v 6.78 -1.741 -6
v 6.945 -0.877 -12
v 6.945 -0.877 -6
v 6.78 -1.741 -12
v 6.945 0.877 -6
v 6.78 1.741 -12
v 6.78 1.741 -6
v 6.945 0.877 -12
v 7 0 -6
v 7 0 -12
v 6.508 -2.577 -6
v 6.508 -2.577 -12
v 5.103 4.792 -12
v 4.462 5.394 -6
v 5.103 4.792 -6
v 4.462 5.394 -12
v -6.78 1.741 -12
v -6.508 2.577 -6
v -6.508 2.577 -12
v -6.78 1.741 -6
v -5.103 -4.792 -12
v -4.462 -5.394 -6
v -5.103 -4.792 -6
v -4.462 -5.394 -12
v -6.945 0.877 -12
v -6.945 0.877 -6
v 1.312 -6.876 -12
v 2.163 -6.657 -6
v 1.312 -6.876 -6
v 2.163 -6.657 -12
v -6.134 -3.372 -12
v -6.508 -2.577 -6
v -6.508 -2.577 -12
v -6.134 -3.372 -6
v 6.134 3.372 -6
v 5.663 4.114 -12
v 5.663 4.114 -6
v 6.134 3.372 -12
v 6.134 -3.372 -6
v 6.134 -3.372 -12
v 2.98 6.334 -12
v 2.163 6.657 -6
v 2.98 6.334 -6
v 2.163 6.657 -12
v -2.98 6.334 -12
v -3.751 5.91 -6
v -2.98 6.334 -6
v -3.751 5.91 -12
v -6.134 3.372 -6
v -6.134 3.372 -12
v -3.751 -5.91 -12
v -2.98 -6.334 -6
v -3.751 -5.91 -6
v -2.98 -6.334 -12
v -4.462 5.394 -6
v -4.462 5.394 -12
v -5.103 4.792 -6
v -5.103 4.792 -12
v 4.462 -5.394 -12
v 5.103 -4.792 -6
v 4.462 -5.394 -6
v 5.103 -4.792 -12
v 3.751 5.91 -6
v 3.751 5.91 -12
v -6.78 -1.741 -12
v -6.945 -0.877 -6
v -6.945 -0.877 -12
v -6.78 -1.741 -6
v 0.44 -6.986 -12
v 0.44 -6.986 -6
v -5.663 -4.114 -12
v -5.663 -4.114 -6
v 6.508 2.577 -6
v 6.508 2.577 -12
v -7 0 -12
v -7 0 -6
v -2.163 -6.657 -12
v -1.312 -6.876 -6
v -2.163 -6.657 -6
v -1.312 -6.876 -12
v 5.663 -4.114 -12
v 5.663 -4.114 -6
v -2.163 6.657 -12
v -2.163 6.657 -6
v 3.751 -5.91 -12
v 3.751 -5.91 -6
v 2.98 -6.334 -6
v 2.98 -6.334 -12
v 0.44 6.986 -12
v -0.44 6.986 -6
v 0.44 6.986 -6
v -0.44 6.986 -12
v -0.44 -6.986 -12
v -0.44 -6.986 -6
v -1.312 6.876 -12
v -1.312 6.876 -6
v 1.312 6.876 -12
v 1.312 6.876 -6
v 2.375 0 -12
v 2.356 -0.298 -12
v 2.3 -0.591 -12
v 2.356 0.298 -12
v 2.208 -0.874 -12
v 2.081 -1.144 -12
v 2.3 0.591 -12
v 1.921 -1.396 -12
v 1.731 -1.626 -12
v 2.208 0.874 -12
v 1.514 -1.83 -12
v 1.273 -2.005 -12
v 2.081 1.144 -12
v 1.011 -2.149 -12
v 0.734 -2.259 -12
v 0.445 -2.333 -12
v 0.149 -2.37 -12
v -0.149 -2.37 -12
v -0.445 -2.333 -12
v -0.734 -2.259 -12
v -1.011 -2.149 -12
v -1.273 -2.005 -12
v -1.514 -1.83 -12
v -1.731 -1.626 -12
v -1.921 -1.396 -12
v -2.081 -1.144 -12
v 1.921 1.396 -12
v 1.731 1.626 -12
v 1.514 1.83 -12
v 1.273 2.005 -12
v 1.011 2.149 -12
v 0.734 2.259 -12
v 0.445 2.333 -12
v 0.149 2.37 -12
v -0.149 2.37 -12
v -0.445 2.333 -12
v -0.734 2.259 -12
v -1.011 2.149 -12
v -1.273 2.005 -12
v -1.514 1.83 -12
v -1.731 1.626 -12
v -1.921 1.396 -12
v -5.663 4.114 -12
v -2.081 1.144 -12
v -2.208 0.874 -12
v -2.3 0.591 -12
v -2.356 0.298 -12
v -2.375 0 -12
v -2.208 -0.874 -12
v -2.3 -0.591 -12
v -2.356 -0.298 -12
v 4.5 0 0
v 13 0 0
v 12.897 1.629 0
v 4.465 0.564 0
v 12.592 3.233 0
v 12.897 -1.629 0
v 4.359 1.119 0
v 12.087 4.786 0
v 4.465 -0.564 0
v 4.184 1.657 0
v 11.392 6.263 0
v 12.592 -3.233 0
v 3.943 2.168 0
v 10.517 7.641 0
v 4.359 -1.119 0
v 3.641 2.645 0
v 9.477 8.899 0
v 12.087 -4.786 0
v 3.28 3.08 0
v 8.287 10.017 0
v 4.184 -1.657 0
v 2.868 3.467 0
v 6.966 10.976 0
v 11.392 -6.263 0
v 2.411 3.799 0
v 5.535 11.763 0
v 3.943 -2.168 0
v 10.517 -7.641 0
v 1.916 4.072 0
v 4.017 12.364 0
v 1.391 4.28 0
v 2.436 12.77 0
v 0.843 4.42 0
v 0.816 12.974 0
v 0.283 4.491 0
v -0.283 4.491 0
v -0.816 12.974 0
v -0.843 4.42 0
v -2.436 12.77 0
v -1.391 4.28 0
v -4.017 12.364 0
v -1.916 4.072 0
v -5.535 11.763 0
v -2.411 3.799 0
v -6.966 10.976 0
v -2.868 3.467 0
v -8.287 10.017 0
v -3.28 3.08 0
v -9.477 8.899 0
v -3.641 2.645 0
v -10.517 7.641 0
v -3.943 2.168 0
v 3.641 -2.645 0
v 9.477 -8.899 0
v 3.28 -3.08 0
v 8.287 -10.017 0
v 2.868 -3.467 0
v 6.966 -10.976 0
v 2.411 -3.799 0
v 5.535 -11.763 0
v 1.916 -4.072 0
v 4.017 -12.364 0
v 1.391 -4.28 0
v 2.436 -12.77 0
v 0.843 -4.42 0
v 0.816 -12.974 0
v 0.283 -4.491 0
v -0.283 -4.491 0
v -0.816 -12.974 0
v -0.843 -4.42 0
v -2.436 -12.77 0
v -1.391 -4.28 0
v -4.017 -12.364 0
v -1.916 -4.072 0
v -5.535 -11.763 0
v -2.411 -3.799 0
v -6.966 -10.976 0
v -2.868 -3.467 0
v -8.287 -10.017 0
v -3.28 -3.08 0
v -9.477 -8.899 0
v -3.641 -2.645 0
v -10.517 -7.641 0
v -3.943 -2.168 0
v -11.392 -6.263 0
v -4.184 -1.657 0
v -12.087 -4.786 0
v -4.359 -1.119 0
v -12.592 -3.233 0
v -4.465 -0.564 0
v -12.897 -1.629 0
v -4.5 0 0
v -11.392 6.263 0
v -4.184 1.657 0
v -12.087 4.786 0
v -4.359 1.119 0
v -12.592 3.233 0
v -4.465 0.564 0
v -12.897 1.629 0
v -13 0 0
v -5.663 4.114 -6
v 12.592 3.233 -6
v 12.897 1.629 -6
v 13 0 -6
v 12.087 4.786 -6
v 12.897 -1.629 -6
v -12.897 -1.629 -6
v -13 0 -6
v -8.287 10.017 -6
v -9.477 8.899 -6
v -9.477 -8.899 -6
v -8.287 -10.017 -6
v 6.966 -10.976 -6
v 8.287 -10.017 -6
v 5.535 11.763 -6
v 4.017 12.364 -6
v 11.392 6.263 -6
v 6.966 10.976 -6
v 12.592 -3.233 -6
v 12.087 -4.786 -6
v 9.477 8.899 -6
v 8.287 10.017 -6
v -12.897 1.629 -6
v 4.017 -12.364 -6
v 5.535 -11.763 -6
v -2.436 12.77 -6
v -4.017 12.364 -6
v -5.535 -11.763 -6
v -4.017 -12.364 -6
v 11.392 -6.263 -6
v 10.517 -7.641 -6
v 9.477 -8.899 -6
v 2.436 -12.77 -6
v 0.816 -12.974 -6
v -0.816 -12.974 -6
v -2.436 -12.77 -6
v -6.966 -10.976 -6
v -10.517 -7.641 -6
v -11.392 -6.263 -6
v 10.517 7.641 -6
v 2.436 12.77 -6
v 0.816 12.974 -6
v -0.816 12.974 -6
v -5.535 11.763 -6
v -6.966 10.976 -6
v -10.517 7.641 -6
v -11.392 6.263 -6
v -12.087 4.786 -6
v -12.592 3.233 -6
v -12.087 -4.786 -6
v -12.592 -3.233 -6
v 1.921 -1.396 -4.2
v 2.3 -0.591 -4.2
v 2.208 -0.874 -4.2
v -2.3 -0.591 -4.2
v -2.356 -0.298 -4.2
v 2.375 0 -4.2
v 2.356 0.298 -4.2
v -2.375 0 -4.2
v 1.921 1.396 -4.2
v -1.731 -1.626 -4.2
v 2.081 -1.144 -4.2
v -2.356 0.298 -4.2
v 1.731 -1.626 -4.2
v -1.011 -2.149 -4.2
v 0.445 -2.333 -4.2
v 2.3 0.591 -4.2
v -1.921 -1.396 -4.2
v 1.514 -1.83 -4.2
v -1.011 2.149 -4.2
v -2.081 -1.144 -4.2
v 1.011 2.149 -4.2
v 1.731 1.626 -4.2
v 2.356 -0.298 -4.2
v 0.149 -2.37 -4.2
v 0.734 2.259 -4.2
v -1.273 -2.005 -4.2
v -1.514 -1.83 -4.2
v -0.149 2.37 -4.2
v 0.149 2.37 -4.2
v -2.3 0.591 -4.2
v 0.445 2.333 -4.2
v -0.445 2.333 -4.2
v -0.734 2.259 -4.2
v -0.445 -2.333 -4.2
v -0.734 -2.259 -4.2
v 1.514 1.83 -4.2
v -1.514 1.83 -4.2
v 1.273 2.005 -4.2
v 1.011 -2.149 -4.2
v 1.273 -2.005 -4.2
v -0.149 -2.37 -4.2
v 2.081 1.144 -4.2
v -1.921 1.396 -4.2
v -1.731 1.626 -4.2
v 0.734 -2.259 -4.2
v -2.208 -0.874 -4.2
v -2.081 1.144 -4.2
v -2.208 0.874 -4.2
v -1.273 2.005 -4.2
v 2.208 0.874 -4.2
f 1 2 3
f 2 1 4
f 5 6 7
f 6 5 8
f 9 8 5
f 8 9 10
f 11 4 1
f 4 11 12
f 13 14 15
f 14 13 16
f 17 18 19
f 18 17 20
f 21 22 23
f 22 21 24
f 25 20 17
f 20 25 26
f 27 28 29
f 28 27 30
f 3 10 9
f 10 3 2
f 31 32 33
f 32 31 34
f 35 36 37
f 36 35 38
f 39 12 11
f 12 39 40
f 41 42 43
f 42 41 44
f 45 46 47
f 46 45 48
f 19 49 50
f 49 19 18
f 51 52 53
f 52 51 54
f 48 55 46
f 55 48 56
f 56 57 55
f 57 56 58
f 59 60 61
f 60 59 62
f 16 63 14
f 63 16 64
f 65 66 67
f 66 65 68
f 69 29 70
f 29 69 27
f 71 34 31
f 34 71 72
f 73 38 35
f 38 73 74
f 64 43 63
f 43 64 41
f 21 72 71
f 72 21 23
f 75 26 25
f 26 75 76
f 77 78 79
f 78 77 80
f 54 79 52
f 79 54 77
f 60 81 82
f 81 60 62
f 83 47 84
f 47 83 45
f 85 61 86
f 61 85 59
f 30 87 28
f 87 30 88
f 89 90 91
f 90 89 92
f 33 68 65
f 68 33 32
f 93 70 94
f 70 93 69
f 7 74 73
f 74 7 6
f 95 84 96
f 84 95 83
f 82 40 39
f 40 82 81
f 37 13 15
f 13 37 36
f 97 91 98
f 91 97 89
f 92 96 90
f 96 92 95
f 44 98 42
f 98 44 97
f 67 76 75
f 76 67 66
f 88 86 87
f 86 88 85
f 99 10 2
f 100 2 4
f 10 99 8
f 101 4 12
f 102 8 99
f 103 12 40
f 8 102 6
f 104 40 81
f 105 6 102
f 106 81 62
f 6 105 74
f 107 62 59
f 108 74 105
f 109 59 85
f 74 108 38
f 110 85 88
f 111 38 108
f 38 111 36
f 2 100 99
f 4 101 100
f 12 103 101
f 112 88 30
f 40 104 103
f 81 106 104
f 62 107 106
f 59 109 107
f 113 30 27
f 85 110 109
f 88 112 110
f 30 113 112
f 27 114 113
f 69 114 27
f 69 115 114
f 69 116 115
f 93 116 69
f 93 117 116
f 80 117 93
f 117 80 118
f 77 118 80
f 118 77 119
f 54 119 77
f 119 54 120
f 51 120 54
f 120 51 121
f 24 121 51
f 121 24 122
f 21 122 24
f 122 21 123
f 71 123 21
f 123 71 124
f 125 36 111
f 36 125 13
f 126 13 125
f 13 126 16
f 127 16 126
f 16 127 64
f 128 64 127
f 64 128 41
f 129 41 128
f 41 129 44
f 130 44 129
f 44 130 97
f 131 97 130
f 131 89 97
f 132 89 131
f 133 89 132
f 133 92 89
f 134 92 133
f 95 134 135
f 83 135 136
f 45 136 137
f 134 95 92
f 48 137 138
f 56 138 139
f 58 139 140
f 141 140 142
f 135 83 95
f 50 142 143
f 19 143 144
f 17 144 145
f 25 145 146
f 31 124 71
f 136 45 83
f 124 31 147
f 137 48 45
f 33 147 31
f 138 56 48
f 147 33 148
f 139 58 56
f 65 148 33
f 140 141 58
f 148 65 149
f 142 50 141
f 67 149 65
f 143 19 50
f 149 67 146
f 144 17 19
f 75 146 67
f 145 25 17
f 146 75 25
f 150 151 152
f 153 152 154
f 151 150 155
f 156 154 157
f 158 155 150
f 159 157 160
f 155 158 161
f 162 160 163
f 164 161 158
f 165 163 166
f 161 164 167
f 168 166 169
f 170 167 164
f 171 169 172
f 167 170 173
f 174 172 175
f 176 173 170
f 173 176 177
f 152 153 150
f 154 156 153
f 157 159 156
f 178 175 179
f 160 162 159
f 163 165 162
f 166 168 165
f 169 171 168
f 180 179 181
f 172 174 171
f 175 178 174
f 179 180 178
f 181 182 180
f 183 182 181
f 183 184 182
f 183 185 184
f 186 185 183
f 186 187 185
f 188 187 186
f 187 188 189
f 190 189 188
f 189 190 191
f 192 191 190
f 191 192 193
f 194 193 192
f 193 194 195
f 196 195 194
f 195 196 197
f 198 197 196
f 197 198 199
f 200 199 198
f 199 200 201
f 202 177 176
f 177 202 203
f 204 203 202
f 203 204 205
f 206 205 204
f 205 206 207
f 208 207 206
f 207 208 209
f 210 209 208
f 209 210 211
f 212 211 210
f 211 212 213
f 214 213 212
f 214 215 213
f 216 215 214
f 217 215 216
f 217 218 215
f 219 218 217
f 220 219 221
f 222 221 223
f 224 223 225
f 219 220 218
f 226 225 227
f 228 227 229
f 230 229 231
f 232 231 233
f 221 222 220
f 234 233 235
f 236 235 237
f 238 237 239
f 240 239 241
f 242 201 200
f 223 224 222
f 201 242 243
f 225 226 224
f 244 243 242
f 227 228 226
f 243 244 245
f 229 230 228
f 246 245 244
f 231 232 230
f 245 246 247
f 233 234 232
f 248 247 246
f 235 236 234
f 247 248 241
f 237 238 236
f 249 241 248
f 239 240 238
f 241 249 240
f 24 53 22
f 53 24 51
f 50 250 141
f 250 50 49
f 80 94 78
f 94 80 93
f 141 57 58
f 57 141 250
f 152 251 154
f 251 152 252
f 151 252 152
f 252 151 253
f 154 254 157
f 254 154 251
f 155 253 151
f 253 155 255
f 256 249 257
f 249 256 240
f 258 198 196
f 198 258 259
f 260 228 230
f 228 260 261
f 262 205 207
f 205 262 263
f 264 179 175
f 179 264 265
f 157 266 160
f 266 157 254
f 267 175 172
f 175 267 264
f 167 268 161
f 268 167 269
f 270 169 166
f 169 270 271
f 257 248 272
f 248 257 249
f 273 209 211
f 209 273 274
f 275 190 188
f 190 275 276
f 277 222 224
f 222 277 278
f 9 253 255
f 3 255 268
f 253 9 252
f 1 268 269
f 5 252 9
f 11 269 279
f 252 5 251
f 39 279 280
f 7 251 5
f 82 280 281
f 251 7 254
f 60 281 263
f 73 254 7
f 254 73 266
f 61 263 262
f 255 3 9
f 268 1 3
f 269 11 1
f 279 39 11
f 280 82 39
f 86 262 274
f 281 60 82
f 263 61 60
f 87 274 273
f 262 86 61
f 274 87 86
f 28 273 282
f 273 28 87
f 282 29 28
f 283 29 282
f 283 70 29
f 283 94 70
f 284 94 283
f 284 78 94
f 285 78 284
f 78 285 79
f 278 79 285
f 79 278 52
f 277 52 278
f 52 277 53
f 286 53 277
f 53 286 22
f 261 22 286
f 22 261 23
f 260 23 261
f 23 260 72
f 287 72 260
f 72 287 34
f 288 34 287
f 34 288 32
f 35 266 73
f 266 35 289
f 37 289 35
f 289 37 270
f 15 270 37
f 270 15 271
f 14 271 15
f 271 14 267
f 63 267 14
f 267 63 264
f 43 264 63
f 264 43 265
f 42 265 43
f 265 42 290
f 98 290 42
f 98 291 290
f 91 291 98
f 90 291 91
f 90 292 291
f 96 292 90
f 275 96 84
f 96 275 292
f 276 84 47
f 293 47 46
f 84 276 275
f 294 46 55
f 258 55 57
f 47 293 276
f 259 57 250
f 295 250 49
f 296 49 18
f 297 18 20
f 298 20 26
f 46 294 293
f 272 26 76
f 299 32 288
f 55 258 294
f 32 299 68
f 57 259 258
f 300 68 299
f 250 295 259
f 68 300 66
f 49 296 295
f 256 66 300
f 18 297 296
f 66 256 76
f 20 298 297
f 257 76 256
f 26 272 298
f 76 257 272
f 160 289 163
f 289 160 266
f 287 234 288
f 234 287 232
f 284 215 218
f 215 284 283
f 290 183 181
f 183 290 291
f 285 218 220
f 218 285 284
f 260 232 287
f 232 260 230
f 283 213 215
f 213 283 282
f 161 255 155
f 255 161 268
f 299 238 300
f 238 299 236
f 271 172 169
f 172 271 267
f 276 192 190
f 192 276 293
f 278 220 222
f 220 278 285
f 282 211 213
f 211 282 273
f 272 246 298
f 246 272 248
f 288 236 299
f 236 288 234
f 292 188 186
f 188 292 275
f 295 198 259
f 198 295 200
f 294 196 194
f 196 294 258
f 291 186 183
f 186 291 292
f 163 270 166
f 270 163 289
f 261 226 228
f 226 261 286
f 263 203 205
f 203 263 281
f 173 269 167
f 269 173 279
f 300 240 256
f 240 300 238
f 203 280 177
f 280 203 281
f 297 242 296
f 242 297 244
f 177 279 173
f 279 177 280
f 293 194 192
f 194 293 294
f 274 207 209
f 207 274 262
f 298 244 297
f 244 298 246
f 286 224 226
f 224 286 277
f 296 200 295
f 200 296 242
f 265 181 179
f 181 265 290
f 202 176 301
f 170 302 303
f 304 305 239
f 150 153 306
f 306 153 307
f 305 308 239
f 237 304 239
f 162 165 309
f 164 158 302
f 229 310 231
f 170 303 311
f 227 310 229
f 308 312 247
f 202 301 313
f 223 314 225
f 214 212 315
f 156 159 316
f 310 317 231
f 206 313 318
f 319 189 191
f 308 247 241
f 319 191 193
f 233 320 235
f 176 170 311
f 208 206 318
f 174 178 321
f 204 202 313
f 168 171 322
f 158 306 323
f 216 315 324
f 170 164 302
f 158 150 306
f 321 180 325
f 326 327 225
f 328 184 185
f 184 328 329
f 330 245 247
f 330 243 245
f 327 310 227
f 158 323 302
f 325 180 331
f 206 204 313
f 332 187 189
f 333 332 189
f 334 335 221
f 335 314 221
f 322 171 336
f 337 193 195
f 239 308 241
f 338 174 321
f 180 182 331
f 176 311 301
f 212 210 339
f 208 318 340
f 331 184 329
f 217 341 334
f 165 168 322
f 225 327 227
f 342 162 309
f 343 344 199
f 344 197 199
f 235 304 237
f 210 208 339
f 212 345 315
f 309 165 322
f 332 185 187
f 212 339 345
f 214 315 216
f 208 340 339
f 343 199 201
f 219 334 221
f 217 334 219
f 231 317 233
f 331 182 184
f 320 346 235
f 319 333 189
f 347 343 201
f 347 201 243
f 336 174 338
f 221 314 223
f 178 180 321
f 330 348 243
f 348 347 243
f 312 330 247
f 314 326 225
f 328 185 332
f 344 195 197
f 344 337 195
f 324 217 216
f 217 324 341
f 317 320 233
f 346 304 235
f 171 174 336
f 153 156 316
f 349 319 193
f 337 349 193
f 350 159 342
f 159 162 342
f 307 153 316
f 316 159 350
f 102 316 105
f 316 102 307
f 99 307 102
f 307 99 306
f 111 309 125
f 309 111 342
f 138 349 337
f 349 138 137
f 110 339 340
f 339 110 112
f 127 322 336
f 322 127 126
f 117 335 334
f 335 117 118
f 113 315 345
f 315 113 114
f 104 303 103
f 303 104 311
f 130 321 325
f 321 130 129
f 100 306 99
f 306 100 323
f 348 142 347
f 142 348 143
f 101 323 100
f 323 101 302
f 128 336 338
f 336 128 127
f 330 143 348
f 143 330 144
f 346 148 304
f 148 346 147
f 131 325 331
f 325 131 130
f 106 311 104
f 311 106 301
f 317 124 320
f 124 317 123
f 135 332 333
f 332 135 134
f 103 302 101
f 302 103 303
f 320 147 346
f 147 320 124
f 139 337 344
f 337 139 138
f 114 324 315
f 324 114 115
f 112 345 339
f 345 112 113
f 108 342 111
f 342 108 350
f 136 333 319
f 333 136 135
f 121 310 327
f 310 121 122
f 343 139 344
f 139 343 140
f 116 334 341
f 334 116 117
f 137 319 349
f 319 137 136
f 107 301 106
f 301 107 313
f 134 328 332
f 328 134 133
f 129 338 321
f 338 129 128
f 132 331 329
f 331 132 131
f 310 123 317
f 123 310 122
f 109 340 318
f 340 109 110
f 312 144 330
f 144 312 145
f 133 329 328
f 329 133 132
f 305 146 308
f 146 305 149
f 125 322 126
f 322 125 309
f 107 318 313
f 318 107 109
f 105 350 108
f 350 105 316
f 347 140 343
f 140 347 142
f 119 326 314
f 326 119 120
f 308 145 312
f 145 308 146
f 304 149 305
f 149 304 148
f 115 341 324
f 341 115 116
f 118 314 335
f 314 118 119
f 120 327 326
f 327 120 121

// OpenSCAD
$fn = 50;


difference() {
	union() {
		translate(v = [0, 0, -12.0000000000]) {
			cylinder(h = 12, r = 7.0000000000);
		}
		translate(v = [0, 0, -6.0000000000]) {
			cylinder(h = 6, r = 13.0000000000);
		}
	}
	union() {
		translate(v = [0, 0, 0]) {
			rotate(a = [0, 0, 0]) {
				difference() {
					union() {
						#translate(v = [0, 0, -12.0000000000]) {
							cylinder(h = 12, r = 2.2500000000);
						}
						#translate(v = [0, 0, -4.2000000000]) {
							cylinder(h = 4.2000000000, r = 7.0000000000, r1 = 2.3750000000, r2 = 4.5000000000);
						}
						#translate(v = [0, 0, -12.0000000000]) {
							cylinder(h = 12, r = 2.3750000000);
						}
						#translate(v = [0, 0, -12.0000000000]) {
							cylinder(h = 12, r = 2.2500000000);
						}
					}
					union();
				}
			}
		}
	}
}
